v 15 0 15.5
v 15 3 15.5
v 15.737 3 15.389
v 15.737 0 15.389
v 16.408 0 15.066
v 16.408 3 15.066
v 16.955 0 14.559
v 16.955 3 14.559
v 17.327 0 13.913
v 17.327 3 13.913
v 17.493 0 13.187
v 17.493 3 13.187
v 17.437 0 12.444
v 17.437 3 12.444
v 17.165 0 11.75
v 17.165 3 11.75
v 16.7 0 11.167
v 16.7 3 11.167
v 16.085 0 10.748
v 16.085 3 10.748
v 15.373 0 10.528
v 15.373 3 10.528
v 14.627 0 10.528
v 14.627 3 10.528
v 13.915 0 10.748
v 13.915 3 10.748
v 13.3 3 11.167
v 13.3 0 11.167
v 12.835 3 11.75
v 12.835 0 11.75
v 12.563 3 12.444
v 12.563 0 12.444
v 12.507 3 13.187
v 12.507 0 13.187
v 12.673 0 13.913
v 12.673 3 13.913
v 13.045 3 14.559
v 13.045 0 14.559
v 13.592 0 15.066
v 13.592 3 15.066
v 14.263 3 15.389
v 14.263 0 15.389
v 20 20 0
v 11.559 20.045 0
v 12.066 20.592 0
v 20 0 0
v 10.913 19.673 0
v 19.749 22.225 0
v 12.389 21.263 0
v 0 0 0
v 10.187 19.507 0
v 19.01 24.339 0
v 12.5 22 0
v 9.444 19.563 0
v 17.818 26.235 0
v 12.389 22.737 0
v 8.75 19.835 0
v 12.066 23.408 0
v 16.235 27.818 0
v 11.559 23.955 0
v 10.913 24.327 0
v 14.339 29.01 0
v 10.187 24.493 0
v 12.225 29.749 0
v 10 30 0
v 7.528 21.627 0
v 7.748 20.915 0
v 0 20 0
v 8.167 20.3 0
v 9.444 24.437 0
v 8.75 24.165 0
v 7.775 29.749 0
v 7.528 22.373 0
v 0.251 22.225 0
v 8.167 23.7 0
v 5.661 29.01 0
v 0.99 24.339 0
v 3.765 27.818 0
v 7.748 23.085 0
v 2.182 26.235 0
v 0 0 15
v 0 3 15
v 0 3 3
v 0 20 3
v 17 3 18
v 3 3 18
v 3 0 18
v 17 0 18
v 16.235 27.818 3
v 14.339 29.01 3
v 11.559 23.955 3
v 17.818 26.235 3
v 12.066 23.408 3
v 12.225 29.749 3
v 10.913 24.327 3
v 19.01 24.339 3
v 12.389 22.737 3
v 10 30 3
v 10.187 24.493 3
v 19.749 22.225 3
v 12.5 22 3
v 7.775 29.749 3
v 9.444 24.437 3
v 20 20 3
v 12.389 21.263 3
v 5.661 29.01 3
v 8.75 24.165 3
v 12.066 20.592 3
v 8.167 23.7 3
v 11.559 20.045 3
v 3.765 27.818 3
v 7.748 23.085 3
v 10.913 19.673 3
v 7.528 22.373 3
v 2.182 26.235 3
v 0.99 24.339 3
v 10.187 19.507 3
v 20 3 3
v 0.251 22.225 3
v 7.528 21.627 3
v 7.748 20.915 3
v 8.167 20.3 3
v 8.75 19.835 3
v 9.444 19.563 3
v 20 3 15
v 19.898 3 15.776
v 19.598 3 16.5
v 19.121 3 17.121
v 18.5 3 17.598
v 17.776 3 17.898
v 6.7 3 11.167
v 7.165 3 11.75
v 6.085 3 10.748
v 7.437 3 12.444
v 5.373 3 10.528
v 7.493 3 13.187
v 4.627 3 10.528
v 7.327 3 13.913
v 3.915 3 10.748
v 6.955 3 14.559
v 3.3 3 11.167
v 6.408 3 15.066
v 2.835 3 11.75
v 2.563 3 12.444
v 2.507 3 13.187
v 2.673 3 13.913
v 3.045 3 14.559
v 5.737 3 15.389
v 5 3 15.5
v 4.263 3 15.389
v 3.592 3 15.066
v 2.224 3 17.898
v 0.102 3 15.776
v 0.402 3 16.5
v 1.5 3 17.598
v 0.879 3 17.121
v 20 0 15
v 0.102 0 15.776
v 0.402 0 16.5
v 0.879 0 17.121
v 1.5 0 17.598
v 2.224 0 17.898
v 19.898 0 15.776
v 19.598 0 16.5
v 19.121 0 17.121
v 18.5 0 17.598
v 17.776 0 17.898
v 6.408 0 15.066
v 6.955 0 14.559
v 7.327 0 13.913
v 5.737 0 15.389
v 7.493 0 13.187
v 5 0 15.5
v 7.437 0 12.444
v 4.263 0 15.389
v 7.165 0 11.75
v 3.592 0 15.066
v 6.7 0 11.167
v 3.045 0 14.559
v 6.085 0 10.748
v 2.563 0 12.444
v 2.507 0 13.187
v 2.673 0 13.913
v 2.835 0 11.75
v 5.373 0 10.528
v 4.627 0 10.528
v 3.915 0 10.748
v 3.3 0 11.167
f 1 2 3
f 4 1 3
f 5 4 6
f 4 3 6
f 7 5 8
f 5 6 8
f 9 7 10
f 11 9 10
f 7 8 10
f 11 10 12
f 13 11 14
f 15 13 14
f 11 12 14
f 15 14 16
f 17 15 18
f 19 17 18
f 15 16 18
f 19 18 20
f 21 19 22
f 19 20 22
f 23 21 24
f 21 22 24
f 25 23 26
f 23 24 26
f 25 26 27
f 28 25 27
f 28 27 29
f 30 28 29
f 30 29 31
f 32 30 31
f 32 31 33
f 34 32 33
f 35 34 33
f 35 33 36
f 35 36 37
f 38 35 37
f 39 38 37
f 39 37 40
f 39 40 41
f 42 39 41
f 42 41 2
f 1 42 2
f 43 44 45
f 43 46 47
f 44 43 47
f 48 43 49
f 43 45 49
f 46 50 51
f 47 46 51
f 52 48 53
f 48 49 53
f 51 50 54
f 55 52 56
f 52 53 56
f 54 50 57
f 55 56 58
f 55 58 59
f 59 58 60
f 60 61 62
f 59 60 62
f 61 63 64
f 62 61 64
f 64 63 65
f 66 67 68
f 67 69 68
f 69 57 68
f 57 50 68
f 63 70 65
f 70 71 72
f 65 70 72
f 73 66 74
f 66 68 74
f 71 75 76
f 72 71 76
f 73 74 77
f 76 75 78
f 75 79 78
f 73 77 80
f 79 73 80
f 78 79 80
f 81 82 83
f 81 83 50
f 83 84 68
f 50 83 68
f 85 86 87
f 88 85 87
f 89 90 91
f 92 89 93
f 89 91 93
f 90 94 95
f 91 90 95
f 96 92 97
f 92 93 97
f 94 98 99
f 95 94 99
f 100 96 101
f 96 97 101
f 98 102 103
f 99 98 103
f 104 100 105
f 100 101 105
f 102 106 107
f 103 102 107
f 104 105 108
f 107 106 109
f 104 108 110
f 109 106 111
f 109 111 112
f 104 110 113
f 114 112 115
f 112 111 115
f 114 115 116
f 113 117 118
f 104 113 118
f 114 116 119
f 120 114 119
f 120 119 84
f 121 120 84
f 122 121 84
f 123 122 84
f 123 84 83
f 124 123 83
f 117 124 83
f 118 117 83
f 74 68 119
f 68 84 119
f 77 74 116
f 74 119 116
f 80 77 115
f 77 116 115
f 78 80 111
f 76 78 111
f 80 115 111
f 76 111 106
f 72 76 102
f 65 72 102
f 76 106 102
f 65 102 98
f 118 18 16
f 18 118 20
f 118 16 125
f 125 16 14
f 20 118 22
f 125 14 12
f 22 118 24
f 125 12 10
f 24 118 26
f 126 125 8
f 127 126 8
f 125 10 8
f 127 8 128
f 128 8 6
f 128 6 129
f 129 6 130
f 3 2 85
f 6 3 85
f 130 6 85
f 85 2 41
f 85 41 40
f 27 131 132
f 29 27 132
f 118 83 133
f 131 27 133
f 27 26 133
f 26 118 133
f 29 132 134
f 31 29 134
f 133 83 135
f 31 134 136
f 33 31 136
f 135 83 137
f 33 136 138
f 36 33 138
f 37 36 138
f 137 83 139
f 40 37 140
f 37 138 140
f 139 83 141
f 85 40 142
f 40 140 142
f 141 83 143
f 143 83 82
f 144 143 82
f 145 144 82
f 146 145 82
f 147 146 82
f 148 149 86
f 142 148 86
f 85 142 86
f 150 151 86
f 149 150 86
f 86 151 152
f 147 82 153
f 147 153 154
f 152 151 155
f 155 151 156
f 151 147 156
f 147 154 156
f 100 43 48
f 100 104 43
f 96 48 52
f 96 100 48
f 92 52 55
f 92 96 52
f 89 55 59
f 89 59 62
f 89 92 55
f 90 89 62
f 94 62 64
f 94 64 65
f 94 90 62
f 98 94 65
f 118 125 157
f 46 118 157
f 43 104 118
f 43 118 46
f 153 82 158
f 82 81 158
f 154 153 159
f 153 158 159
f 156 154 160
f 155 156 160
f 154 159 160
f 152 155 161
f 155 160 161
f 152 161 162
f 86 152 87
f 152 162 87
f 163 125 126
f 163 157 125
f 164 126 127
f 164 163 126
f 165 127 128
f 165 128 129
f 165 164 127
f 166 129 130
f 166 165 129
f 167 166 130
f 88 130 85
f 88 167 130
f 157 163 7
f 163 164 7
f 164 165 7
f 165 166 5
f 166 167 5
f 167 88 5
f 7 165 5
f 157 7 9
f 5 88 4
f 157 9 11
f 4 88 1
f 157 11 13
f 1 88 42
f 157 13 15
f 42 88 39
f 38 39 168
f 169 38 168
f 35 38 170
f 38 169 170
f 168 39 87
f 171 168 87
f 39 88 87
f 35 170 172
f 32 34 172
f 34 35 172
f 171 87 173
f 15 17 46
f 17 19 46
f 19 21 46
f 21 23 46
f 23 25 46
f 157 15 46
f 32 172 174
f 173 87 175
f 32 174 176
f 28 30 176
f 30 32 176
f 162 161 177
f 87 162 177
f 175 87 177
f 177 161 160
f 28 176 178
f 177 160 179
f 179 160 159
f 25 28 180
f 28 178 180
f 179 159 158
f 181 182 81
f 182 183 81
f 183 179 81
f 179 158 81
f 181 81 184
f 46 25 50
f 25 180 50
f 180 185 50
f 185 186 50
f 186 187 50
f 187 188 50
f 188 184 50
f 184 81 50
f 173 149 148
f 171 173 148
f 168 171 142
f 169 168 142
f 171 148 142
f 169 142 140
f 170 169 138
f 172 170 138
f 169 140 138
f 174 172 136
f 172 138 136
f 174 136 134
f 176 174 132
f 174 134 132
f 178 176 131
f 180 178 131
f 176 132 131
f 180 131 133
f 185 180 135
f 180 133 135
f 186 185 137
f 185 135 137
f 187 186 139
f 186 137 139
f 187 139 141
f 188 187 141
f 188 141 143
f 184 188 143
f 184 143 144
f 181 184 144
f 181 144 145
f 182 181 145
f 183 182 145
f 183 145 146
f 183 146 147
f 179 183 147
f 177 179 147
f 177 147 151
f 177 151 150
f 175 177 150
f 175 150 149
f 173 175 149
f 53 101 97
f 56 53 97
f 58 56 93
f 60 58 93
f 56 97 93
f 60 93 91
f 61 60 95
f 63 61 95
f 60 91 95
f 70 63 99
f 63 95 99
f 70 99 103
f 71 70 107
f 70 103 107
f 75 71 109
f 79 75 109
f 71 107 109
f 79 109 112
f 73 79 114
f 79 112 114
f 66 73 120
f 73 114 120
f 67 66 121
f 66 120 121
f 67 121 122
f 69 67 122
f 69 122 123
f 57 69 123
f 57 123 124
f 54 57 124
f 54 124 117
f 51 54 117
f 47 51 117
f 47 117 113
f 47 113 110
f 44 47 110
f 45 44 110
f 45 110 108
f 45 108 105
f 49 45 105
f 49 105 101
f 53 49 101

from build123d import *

# Parameters (mm, degrees)
BOSS_EXTRUDE3_DEPTH = 20
SKETCH4_R           = 2.5
CUT_EXTRUDE1_DEPTH  = 20
SKETCH5_R           = 2.5
CUT_EXTRUDE2_DEPTH  = 20
FILLET1_R           = 10
FILLET2_R           = 3


with BuildPart() as part:
    # Sketch3 → Boss-Extrude3 (new body)
    with BuildSketch(Plane(origin=(0, 0, 0), x_dir=(0, 0, -1), z_dir=(1, 0, 0))):
        Polygon((0, 0), (0, 30), (-3, 30), (-3, 3), (-18, 3), (-18, 0), align=None)
    extrude(amount=BOSS_EXTRUDE3_DEPTH)

    # Sketch4 → Cut-Extrude1 (cut)
    with BuildSketch(Plane.XY.offset(3)):
        with Locations((10, 22)):
            Circle(SKETCH4_R)
    extrude(amount=-CUT_EXTRUDE1_DEPTH, mode=Mode.SUBTRACT)

    # Sketch5 → Cut-Extrude2 (cut)
    with BuildSketch(Plane(origin=(0, 3, 0), x_dir=(1, 0, 0), z_dir=(0, 1, 0))):
        with Locations(Location((5, -13, 0), (0, 0, 270))):
            Circle(SKETCH5_R)
        with Locations(Location((15, -13, 0), (0, 0, 270))):
            Circle(SKETCH5_R)
    extrude(amount=-CUT_EXTRUDE2_DEPTH, mode=Mode.SUBTRACT)

    # Fillet1
    fillet1_edges = [part.edges().sort_by_distance(p)[0] for p in [
        (0, 30, 1.5),
        (20, 30, 1.5),
    ]]
    fillet(fillet1_edges, radius=FILLET1_R - 0.0001)  # a hair under: the kernel refuses the full size

    # Fillet2
    fillet2_edges = [part.edges().sort_by_distance(p)[0] for p in [
        (20, 1.5, 18),
        (0, 1.5, 18),
    ]]
    fillet(fillet2_edges, radius=FILLET2_R)


solid = part.part
